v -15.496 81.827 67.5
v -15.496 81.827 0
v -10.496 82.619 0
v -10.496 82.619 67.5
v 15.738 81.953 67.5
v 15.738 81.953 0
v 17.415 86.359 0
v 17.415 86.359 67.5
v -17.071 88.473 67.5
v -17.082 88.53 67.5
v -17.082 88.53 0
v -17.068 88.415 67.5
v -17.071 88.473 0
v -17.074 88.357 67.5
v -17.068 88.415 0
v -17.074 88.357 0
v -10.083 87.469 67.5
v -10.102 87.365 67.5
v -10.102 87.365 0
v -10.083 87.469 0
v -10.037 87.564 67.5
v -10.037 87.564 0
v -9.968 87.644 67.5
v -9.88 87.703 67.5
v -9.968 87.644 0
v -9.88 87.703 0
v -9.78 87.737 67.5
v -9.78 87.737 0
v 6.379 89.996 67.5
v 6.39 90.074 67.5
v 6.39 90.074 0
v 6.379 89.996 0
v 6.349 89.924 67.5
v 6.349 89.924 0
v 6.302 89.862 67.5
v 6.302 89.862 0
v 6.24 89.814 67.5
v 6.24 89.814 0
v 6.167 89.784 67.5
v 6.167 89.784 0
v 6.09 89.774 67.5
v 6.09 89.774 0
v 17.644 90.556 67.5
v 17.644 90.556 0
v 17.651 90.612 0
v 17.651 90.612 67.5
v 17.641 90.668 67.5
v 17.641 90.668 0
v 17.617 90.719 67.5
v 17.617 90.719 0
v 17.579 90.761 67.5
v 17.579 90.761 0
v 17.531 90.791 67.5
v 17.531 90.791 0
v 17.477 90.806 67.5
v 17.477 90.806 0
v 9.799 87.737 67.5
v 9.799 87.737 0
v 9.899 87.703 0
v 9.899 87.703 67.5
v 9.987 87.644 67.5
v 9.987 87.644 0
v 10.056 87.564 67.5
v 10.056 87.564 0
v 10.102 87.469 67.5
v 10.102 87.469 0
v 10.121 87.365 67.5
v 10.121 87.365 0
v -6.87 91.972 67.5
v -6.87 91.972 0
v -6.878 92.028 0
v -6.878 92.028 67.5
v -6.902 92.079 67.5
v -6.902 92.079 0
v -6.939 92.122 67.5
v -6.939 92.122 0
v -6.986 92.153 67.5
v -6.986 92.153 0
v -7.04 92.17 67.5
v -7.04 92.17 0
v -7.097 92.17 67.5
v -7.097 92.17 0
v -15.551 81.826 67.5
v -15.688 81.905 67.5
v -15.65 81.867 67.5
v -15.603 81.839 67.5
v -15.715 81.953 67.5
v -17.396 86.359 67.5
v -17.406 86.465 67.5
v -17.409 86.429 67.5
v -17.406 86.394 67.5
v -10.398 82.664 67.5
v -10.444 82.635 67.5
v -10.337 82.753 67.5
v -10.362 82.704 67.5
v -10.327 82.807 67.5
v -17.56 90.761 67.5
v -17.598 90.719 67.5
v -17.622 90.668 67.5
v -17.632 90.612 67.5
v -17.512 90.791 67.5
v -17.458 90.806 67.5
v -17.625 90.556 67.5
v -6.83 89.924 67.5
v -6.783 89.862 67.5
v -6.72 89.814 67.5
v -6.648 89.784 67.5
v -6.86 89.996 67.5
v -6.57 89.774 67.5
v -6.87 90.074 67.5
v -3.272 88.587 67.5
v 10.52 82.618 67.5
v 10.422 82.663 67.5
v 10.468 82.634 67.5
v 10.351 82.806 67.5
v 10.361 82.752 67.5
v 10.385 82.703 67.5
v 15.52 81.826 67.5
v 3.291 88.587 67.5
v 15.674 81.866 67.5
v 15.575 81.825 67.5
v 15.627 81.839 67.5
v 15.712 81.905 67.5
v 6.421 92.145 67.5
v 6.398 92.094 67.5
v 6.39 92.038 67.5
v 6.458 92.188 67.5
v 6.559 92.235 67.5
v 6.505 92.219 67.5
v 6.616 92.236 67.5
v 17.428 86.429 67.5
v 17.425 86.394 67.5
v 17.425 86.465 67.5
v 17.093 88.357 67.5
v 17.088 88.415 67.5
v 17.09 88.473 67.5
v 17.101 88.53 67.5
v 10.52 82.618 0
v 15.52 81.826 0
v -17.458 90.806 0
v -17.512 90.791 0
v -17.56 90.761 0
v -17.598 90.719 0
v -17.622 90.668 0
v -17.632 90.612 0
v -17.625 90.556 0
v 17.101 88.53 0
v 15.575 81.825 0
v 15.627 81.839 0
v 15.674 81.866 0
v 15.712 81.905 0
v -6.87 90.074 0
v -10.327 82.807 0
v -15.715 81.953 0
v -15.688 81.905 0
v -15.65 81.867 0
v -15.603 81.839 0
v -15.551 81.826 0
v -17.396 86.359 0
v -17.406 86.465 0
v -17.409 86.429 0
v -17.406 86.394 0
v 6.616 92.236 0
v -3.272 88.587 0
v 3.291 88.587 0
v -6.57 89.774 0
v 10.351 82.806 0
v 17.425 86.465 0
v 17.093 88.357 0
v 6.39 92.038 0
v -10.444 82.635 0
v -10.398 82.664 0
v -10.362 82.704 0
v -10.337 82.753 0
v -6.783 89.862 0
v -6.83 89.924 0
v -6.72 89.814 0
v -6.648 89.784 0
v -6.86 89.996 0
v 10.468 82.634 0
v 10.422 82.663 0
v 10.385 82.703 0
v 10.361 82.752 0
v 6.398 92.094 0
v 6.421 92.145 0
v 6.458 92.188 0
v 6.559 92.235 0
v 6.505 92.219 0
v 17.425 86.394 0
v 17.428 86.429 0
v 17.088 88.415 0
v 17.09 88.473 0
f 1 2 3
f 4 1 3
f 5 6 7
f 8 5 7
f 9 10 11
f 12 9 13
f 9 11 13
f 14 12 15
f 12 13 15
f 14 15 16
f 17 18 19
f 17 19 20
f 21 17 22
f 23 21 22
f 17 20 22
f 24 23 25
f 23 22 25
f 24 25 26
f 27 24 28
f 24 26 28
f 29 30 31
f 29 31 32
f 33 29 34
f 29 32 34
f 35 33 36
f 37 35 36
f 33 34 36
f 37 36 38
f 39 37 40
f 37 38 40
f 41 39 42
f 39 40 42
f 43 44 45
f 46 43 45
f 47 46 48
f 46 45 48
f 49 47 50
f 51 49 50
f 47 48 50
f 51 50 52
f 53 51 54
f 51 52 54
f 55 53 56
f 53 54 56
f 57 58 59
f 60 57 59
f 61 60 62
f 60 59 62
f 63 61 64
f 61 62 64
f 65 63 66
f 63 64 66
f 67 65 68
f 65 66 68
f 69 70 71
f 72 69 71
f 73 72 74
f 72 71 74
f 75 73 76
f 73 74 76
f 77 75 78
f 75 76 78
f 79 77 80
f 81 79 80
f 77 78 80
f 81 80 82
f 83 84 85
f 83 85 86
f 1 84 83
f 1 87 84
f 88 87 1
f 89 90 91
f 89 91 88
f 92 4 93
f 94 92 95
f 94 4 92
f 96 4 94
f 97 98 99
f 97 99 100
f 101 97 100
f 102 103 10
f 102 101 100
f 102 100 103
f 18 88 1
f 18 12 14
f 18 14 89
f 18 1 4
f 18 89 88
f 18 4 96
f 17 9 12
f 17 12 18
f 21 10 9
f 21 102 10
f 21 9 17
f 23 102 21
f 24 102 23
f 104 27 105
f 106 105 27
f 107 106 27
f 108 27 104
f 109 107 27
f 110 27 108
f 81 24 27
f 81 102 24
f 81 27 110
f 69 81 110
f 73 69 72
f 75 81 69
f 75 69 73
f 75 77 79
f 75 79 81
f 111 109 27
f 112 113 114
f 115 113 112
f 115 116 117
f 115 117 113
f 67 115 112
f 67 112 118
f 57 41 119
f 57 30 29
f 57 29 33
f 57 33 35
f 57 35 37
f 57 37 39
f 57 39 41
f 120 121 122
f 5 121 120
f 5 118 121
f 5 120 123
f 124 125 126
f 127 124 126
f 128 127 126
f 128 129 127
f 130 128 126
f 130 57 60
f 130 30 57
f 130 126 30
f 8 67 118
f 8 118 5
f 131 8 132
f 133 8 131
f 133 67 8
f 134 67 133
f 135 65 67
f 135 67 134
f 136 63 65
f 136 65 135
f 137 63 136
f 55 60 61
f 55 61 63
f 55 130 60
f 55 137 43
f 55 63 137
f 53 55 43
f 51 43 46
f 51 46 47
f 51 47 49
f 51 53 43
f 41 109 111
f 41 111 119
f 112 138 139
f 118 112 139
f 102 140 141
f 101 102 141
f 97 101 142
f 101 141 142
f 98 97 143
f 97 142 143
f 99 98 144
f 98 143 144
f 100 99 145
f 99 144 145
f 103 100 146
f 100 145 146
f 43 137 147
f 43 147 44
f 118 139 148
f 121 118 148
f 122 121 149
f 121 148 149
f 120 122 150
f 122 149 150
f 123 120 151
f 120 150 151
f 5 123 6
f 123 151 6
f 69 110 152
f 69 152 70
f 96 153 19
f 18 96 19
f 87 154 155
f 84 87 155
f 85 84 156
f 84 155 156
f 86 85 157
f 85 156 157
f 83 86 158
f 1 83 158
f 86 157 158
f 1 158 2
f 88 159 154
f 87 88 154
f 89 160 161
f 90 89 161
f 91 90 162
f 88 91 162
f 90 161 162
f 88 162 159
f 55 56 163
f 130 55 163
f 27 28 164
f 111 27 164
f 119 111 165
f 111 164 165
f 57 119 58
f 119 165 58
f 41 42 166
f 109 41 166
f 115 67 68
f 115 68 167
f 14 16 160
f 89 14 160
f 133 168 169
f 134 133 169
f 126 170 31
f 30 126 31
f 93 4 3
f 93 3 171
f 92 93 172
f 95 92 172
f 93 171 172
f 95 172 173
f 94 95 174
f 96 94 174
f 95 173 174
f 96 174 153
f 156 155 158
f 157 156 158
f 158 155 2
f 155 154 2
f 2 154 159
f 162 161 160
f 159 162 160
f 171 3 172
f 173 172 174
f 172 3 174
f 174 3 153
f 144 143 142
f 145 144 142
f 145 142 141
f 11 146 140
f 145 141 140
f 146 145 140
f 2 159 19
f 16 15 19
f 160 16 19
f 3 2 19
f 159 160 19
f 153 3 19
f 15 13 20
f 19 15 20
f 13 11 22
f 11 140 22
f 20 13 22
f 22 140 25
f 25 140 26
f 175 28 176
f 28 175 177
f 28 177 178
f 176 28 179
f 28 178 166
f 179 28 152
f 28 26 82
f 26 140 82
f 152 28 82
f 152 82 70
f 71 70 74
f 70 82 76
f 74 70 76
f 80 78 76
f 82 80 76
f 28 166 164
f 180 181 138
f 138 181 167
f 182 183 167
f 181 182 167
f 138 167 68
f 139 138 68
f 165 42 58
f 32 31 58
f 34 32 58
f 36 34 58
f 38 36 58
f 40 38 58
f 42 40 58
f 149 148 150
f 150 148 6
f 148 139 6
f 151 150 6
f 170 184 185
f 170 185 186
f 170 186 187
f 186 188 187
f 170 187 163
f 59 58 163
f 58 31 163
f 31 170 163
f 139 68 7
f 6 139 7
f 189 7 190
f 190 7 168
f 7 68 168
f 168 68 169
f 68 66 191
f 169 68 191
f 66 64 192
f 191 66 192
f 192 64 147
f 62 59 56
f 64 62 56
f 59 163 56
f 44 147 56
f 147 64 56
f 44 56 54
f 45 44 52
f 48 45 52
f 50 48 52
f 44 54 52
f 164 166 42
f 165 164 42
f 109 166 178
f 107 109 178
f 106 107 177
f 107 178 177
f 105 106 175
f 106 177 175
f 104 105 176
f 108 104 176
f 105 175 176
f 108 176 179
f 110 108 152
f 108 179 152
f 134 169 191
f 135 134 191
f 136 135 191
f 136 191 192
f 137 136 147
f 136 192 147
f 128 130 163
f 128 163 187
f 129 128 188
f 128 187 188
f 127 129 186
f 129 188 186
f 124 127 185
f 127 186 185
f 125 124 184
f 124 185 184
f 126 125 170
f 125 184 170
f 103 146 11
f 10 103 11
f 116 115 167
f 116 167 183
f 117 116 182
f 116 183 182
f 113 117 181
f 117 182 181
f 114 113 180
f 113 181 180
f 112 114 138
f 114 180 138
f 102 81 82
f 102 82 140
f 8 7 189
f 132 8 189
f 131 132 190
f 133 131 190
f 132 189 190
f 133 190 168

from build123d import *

# Parameters (mm, degrees)
BOSS_EXTRUDE2_DEPTH = 67.5


with BuildPart() as part:
    # Sketch1 → Boss-Extrude2 (new body)
    with BuildSketch(Plane.XY):
        with BuildLine():
            Line((-17.624839098, 90.556097537), (-17.081964944, 88.53006361))
            ThreePointArc((-17.081964944, 88.53006361), (-17.06872461, 88.444180172), (-17.07434408, 88.357464009))
            Line((-17.07434408, 88.357464009), (-17.406101009, 86.465100374))
            ThreePointArc((-17.406101009, 86.465100374), (-17.408194108, 86.4114937), (-17.395962494, 86.359259189))
            Line((-17.395962494, 86.359259189), (-15.714560006, 81.953100992))
            ThreePointArc((-15.714560006, 81.953100992), (-15.62787368, 81.851299803), (-15.496416031, 81.826868517))
            Line((-15.496416031, 81.826868517), (-10.495838808, 82.618882142))
            ThreePointArc((-10.495838808, 82.618882142), (-10.378300643, 82.682811793), (-10.327369953, 82.806538448))
            Line((-10.327369953, 82.806538448), (-10.101894168, 87.364622968))
            ThreePointArc((-10.101894168, 87.364622968), (-10.0050052, 87.606431661), (-9.779768503, 87.737303149))
            ThreePointArc((-9.779768503, 87.737303149), (0.009655574, 88.693275712), (9.799075243, 87.737258013))
            ThreePointArc((9.799075243, 87.737258013), (10.024185058, 87.606531513), (10.121179929, 87.364961975))
            Line((10.121179929, 87.364961975), (10.351109341, 82.805609758))
            ThreePointArc((10.351109341, 82.805609758), (10.40209464, 82.682003526), (10.519568611, 82.618145345))
            Line((10.519568611, 82.618145345), (15.520145834, 81.82613172))
            ThreePointArc((15.520145834, 81.82613172), (15.65168662, 81.850611141), (15.738358224, 81.952543733))
            Line((15.738358224, 81.952543733), (17.415135527, 86.359286022))
            ThreePointArc((17.415135527, 86.359286022), (17.427307864, 86.411436625), (17.425205627, 86.464947668))
            Line((17.425205627, 86.464947668), (17.093421927, 88.357464009))
            ThreePointArc((17.093421927, 88.357464009), (17.087802457, 88.444180172), (17.101042791, 88.53006361))
            Line((17.101042791, 88.53006361), (17.643916946, 90.556097537))
            ThreePointArc((17.643916946, 90.556097537), (17.617025703, 90.718975393), (17.476837019, 90.806150319))
            Line((17.476837019, 90.806150319), (6.615644162, 92.236053485))
            ThreePointArc((6.615644162, 92.236053485), (6.457669761, 92.188132474), (6.389538924, 92.037764513))
            Line((6.389538924, 92.037764513), (6.389538924, 90.07390614))
            ThreePointArc((6.389538924, 90.07390614), (6.301670958, 89.861774106), (6.089538924, 89.77390614))
            Line((6.089538924, 89.77390614), (-6.570461076, 89.77390614))
            ThreePointArc((-6.570461076, 89.77390614), (-6.782593111, 89.861774106), (-6.870461076, 90.07390614))
            Line((-6.870461076, 90.07390614), (-6.870461076, 91.971938264))
            ThreePointArc((-6.870461076, 91.971938264), (-6.938591913, 92.122306225), (-7.096566315, 92.170227236))
            Line((-7.096566315, 92.170227236), (-17.457759172, 90.806150319))
            ThreePointArc((-17.457759172, 90.806150319), (-17.597947856, 90.718975393), (-17.624839098, 90.556097537))
        make_face()
    extrude(amount=BOSS_EXTRUDE2_DEPTH)


solid = part.part
